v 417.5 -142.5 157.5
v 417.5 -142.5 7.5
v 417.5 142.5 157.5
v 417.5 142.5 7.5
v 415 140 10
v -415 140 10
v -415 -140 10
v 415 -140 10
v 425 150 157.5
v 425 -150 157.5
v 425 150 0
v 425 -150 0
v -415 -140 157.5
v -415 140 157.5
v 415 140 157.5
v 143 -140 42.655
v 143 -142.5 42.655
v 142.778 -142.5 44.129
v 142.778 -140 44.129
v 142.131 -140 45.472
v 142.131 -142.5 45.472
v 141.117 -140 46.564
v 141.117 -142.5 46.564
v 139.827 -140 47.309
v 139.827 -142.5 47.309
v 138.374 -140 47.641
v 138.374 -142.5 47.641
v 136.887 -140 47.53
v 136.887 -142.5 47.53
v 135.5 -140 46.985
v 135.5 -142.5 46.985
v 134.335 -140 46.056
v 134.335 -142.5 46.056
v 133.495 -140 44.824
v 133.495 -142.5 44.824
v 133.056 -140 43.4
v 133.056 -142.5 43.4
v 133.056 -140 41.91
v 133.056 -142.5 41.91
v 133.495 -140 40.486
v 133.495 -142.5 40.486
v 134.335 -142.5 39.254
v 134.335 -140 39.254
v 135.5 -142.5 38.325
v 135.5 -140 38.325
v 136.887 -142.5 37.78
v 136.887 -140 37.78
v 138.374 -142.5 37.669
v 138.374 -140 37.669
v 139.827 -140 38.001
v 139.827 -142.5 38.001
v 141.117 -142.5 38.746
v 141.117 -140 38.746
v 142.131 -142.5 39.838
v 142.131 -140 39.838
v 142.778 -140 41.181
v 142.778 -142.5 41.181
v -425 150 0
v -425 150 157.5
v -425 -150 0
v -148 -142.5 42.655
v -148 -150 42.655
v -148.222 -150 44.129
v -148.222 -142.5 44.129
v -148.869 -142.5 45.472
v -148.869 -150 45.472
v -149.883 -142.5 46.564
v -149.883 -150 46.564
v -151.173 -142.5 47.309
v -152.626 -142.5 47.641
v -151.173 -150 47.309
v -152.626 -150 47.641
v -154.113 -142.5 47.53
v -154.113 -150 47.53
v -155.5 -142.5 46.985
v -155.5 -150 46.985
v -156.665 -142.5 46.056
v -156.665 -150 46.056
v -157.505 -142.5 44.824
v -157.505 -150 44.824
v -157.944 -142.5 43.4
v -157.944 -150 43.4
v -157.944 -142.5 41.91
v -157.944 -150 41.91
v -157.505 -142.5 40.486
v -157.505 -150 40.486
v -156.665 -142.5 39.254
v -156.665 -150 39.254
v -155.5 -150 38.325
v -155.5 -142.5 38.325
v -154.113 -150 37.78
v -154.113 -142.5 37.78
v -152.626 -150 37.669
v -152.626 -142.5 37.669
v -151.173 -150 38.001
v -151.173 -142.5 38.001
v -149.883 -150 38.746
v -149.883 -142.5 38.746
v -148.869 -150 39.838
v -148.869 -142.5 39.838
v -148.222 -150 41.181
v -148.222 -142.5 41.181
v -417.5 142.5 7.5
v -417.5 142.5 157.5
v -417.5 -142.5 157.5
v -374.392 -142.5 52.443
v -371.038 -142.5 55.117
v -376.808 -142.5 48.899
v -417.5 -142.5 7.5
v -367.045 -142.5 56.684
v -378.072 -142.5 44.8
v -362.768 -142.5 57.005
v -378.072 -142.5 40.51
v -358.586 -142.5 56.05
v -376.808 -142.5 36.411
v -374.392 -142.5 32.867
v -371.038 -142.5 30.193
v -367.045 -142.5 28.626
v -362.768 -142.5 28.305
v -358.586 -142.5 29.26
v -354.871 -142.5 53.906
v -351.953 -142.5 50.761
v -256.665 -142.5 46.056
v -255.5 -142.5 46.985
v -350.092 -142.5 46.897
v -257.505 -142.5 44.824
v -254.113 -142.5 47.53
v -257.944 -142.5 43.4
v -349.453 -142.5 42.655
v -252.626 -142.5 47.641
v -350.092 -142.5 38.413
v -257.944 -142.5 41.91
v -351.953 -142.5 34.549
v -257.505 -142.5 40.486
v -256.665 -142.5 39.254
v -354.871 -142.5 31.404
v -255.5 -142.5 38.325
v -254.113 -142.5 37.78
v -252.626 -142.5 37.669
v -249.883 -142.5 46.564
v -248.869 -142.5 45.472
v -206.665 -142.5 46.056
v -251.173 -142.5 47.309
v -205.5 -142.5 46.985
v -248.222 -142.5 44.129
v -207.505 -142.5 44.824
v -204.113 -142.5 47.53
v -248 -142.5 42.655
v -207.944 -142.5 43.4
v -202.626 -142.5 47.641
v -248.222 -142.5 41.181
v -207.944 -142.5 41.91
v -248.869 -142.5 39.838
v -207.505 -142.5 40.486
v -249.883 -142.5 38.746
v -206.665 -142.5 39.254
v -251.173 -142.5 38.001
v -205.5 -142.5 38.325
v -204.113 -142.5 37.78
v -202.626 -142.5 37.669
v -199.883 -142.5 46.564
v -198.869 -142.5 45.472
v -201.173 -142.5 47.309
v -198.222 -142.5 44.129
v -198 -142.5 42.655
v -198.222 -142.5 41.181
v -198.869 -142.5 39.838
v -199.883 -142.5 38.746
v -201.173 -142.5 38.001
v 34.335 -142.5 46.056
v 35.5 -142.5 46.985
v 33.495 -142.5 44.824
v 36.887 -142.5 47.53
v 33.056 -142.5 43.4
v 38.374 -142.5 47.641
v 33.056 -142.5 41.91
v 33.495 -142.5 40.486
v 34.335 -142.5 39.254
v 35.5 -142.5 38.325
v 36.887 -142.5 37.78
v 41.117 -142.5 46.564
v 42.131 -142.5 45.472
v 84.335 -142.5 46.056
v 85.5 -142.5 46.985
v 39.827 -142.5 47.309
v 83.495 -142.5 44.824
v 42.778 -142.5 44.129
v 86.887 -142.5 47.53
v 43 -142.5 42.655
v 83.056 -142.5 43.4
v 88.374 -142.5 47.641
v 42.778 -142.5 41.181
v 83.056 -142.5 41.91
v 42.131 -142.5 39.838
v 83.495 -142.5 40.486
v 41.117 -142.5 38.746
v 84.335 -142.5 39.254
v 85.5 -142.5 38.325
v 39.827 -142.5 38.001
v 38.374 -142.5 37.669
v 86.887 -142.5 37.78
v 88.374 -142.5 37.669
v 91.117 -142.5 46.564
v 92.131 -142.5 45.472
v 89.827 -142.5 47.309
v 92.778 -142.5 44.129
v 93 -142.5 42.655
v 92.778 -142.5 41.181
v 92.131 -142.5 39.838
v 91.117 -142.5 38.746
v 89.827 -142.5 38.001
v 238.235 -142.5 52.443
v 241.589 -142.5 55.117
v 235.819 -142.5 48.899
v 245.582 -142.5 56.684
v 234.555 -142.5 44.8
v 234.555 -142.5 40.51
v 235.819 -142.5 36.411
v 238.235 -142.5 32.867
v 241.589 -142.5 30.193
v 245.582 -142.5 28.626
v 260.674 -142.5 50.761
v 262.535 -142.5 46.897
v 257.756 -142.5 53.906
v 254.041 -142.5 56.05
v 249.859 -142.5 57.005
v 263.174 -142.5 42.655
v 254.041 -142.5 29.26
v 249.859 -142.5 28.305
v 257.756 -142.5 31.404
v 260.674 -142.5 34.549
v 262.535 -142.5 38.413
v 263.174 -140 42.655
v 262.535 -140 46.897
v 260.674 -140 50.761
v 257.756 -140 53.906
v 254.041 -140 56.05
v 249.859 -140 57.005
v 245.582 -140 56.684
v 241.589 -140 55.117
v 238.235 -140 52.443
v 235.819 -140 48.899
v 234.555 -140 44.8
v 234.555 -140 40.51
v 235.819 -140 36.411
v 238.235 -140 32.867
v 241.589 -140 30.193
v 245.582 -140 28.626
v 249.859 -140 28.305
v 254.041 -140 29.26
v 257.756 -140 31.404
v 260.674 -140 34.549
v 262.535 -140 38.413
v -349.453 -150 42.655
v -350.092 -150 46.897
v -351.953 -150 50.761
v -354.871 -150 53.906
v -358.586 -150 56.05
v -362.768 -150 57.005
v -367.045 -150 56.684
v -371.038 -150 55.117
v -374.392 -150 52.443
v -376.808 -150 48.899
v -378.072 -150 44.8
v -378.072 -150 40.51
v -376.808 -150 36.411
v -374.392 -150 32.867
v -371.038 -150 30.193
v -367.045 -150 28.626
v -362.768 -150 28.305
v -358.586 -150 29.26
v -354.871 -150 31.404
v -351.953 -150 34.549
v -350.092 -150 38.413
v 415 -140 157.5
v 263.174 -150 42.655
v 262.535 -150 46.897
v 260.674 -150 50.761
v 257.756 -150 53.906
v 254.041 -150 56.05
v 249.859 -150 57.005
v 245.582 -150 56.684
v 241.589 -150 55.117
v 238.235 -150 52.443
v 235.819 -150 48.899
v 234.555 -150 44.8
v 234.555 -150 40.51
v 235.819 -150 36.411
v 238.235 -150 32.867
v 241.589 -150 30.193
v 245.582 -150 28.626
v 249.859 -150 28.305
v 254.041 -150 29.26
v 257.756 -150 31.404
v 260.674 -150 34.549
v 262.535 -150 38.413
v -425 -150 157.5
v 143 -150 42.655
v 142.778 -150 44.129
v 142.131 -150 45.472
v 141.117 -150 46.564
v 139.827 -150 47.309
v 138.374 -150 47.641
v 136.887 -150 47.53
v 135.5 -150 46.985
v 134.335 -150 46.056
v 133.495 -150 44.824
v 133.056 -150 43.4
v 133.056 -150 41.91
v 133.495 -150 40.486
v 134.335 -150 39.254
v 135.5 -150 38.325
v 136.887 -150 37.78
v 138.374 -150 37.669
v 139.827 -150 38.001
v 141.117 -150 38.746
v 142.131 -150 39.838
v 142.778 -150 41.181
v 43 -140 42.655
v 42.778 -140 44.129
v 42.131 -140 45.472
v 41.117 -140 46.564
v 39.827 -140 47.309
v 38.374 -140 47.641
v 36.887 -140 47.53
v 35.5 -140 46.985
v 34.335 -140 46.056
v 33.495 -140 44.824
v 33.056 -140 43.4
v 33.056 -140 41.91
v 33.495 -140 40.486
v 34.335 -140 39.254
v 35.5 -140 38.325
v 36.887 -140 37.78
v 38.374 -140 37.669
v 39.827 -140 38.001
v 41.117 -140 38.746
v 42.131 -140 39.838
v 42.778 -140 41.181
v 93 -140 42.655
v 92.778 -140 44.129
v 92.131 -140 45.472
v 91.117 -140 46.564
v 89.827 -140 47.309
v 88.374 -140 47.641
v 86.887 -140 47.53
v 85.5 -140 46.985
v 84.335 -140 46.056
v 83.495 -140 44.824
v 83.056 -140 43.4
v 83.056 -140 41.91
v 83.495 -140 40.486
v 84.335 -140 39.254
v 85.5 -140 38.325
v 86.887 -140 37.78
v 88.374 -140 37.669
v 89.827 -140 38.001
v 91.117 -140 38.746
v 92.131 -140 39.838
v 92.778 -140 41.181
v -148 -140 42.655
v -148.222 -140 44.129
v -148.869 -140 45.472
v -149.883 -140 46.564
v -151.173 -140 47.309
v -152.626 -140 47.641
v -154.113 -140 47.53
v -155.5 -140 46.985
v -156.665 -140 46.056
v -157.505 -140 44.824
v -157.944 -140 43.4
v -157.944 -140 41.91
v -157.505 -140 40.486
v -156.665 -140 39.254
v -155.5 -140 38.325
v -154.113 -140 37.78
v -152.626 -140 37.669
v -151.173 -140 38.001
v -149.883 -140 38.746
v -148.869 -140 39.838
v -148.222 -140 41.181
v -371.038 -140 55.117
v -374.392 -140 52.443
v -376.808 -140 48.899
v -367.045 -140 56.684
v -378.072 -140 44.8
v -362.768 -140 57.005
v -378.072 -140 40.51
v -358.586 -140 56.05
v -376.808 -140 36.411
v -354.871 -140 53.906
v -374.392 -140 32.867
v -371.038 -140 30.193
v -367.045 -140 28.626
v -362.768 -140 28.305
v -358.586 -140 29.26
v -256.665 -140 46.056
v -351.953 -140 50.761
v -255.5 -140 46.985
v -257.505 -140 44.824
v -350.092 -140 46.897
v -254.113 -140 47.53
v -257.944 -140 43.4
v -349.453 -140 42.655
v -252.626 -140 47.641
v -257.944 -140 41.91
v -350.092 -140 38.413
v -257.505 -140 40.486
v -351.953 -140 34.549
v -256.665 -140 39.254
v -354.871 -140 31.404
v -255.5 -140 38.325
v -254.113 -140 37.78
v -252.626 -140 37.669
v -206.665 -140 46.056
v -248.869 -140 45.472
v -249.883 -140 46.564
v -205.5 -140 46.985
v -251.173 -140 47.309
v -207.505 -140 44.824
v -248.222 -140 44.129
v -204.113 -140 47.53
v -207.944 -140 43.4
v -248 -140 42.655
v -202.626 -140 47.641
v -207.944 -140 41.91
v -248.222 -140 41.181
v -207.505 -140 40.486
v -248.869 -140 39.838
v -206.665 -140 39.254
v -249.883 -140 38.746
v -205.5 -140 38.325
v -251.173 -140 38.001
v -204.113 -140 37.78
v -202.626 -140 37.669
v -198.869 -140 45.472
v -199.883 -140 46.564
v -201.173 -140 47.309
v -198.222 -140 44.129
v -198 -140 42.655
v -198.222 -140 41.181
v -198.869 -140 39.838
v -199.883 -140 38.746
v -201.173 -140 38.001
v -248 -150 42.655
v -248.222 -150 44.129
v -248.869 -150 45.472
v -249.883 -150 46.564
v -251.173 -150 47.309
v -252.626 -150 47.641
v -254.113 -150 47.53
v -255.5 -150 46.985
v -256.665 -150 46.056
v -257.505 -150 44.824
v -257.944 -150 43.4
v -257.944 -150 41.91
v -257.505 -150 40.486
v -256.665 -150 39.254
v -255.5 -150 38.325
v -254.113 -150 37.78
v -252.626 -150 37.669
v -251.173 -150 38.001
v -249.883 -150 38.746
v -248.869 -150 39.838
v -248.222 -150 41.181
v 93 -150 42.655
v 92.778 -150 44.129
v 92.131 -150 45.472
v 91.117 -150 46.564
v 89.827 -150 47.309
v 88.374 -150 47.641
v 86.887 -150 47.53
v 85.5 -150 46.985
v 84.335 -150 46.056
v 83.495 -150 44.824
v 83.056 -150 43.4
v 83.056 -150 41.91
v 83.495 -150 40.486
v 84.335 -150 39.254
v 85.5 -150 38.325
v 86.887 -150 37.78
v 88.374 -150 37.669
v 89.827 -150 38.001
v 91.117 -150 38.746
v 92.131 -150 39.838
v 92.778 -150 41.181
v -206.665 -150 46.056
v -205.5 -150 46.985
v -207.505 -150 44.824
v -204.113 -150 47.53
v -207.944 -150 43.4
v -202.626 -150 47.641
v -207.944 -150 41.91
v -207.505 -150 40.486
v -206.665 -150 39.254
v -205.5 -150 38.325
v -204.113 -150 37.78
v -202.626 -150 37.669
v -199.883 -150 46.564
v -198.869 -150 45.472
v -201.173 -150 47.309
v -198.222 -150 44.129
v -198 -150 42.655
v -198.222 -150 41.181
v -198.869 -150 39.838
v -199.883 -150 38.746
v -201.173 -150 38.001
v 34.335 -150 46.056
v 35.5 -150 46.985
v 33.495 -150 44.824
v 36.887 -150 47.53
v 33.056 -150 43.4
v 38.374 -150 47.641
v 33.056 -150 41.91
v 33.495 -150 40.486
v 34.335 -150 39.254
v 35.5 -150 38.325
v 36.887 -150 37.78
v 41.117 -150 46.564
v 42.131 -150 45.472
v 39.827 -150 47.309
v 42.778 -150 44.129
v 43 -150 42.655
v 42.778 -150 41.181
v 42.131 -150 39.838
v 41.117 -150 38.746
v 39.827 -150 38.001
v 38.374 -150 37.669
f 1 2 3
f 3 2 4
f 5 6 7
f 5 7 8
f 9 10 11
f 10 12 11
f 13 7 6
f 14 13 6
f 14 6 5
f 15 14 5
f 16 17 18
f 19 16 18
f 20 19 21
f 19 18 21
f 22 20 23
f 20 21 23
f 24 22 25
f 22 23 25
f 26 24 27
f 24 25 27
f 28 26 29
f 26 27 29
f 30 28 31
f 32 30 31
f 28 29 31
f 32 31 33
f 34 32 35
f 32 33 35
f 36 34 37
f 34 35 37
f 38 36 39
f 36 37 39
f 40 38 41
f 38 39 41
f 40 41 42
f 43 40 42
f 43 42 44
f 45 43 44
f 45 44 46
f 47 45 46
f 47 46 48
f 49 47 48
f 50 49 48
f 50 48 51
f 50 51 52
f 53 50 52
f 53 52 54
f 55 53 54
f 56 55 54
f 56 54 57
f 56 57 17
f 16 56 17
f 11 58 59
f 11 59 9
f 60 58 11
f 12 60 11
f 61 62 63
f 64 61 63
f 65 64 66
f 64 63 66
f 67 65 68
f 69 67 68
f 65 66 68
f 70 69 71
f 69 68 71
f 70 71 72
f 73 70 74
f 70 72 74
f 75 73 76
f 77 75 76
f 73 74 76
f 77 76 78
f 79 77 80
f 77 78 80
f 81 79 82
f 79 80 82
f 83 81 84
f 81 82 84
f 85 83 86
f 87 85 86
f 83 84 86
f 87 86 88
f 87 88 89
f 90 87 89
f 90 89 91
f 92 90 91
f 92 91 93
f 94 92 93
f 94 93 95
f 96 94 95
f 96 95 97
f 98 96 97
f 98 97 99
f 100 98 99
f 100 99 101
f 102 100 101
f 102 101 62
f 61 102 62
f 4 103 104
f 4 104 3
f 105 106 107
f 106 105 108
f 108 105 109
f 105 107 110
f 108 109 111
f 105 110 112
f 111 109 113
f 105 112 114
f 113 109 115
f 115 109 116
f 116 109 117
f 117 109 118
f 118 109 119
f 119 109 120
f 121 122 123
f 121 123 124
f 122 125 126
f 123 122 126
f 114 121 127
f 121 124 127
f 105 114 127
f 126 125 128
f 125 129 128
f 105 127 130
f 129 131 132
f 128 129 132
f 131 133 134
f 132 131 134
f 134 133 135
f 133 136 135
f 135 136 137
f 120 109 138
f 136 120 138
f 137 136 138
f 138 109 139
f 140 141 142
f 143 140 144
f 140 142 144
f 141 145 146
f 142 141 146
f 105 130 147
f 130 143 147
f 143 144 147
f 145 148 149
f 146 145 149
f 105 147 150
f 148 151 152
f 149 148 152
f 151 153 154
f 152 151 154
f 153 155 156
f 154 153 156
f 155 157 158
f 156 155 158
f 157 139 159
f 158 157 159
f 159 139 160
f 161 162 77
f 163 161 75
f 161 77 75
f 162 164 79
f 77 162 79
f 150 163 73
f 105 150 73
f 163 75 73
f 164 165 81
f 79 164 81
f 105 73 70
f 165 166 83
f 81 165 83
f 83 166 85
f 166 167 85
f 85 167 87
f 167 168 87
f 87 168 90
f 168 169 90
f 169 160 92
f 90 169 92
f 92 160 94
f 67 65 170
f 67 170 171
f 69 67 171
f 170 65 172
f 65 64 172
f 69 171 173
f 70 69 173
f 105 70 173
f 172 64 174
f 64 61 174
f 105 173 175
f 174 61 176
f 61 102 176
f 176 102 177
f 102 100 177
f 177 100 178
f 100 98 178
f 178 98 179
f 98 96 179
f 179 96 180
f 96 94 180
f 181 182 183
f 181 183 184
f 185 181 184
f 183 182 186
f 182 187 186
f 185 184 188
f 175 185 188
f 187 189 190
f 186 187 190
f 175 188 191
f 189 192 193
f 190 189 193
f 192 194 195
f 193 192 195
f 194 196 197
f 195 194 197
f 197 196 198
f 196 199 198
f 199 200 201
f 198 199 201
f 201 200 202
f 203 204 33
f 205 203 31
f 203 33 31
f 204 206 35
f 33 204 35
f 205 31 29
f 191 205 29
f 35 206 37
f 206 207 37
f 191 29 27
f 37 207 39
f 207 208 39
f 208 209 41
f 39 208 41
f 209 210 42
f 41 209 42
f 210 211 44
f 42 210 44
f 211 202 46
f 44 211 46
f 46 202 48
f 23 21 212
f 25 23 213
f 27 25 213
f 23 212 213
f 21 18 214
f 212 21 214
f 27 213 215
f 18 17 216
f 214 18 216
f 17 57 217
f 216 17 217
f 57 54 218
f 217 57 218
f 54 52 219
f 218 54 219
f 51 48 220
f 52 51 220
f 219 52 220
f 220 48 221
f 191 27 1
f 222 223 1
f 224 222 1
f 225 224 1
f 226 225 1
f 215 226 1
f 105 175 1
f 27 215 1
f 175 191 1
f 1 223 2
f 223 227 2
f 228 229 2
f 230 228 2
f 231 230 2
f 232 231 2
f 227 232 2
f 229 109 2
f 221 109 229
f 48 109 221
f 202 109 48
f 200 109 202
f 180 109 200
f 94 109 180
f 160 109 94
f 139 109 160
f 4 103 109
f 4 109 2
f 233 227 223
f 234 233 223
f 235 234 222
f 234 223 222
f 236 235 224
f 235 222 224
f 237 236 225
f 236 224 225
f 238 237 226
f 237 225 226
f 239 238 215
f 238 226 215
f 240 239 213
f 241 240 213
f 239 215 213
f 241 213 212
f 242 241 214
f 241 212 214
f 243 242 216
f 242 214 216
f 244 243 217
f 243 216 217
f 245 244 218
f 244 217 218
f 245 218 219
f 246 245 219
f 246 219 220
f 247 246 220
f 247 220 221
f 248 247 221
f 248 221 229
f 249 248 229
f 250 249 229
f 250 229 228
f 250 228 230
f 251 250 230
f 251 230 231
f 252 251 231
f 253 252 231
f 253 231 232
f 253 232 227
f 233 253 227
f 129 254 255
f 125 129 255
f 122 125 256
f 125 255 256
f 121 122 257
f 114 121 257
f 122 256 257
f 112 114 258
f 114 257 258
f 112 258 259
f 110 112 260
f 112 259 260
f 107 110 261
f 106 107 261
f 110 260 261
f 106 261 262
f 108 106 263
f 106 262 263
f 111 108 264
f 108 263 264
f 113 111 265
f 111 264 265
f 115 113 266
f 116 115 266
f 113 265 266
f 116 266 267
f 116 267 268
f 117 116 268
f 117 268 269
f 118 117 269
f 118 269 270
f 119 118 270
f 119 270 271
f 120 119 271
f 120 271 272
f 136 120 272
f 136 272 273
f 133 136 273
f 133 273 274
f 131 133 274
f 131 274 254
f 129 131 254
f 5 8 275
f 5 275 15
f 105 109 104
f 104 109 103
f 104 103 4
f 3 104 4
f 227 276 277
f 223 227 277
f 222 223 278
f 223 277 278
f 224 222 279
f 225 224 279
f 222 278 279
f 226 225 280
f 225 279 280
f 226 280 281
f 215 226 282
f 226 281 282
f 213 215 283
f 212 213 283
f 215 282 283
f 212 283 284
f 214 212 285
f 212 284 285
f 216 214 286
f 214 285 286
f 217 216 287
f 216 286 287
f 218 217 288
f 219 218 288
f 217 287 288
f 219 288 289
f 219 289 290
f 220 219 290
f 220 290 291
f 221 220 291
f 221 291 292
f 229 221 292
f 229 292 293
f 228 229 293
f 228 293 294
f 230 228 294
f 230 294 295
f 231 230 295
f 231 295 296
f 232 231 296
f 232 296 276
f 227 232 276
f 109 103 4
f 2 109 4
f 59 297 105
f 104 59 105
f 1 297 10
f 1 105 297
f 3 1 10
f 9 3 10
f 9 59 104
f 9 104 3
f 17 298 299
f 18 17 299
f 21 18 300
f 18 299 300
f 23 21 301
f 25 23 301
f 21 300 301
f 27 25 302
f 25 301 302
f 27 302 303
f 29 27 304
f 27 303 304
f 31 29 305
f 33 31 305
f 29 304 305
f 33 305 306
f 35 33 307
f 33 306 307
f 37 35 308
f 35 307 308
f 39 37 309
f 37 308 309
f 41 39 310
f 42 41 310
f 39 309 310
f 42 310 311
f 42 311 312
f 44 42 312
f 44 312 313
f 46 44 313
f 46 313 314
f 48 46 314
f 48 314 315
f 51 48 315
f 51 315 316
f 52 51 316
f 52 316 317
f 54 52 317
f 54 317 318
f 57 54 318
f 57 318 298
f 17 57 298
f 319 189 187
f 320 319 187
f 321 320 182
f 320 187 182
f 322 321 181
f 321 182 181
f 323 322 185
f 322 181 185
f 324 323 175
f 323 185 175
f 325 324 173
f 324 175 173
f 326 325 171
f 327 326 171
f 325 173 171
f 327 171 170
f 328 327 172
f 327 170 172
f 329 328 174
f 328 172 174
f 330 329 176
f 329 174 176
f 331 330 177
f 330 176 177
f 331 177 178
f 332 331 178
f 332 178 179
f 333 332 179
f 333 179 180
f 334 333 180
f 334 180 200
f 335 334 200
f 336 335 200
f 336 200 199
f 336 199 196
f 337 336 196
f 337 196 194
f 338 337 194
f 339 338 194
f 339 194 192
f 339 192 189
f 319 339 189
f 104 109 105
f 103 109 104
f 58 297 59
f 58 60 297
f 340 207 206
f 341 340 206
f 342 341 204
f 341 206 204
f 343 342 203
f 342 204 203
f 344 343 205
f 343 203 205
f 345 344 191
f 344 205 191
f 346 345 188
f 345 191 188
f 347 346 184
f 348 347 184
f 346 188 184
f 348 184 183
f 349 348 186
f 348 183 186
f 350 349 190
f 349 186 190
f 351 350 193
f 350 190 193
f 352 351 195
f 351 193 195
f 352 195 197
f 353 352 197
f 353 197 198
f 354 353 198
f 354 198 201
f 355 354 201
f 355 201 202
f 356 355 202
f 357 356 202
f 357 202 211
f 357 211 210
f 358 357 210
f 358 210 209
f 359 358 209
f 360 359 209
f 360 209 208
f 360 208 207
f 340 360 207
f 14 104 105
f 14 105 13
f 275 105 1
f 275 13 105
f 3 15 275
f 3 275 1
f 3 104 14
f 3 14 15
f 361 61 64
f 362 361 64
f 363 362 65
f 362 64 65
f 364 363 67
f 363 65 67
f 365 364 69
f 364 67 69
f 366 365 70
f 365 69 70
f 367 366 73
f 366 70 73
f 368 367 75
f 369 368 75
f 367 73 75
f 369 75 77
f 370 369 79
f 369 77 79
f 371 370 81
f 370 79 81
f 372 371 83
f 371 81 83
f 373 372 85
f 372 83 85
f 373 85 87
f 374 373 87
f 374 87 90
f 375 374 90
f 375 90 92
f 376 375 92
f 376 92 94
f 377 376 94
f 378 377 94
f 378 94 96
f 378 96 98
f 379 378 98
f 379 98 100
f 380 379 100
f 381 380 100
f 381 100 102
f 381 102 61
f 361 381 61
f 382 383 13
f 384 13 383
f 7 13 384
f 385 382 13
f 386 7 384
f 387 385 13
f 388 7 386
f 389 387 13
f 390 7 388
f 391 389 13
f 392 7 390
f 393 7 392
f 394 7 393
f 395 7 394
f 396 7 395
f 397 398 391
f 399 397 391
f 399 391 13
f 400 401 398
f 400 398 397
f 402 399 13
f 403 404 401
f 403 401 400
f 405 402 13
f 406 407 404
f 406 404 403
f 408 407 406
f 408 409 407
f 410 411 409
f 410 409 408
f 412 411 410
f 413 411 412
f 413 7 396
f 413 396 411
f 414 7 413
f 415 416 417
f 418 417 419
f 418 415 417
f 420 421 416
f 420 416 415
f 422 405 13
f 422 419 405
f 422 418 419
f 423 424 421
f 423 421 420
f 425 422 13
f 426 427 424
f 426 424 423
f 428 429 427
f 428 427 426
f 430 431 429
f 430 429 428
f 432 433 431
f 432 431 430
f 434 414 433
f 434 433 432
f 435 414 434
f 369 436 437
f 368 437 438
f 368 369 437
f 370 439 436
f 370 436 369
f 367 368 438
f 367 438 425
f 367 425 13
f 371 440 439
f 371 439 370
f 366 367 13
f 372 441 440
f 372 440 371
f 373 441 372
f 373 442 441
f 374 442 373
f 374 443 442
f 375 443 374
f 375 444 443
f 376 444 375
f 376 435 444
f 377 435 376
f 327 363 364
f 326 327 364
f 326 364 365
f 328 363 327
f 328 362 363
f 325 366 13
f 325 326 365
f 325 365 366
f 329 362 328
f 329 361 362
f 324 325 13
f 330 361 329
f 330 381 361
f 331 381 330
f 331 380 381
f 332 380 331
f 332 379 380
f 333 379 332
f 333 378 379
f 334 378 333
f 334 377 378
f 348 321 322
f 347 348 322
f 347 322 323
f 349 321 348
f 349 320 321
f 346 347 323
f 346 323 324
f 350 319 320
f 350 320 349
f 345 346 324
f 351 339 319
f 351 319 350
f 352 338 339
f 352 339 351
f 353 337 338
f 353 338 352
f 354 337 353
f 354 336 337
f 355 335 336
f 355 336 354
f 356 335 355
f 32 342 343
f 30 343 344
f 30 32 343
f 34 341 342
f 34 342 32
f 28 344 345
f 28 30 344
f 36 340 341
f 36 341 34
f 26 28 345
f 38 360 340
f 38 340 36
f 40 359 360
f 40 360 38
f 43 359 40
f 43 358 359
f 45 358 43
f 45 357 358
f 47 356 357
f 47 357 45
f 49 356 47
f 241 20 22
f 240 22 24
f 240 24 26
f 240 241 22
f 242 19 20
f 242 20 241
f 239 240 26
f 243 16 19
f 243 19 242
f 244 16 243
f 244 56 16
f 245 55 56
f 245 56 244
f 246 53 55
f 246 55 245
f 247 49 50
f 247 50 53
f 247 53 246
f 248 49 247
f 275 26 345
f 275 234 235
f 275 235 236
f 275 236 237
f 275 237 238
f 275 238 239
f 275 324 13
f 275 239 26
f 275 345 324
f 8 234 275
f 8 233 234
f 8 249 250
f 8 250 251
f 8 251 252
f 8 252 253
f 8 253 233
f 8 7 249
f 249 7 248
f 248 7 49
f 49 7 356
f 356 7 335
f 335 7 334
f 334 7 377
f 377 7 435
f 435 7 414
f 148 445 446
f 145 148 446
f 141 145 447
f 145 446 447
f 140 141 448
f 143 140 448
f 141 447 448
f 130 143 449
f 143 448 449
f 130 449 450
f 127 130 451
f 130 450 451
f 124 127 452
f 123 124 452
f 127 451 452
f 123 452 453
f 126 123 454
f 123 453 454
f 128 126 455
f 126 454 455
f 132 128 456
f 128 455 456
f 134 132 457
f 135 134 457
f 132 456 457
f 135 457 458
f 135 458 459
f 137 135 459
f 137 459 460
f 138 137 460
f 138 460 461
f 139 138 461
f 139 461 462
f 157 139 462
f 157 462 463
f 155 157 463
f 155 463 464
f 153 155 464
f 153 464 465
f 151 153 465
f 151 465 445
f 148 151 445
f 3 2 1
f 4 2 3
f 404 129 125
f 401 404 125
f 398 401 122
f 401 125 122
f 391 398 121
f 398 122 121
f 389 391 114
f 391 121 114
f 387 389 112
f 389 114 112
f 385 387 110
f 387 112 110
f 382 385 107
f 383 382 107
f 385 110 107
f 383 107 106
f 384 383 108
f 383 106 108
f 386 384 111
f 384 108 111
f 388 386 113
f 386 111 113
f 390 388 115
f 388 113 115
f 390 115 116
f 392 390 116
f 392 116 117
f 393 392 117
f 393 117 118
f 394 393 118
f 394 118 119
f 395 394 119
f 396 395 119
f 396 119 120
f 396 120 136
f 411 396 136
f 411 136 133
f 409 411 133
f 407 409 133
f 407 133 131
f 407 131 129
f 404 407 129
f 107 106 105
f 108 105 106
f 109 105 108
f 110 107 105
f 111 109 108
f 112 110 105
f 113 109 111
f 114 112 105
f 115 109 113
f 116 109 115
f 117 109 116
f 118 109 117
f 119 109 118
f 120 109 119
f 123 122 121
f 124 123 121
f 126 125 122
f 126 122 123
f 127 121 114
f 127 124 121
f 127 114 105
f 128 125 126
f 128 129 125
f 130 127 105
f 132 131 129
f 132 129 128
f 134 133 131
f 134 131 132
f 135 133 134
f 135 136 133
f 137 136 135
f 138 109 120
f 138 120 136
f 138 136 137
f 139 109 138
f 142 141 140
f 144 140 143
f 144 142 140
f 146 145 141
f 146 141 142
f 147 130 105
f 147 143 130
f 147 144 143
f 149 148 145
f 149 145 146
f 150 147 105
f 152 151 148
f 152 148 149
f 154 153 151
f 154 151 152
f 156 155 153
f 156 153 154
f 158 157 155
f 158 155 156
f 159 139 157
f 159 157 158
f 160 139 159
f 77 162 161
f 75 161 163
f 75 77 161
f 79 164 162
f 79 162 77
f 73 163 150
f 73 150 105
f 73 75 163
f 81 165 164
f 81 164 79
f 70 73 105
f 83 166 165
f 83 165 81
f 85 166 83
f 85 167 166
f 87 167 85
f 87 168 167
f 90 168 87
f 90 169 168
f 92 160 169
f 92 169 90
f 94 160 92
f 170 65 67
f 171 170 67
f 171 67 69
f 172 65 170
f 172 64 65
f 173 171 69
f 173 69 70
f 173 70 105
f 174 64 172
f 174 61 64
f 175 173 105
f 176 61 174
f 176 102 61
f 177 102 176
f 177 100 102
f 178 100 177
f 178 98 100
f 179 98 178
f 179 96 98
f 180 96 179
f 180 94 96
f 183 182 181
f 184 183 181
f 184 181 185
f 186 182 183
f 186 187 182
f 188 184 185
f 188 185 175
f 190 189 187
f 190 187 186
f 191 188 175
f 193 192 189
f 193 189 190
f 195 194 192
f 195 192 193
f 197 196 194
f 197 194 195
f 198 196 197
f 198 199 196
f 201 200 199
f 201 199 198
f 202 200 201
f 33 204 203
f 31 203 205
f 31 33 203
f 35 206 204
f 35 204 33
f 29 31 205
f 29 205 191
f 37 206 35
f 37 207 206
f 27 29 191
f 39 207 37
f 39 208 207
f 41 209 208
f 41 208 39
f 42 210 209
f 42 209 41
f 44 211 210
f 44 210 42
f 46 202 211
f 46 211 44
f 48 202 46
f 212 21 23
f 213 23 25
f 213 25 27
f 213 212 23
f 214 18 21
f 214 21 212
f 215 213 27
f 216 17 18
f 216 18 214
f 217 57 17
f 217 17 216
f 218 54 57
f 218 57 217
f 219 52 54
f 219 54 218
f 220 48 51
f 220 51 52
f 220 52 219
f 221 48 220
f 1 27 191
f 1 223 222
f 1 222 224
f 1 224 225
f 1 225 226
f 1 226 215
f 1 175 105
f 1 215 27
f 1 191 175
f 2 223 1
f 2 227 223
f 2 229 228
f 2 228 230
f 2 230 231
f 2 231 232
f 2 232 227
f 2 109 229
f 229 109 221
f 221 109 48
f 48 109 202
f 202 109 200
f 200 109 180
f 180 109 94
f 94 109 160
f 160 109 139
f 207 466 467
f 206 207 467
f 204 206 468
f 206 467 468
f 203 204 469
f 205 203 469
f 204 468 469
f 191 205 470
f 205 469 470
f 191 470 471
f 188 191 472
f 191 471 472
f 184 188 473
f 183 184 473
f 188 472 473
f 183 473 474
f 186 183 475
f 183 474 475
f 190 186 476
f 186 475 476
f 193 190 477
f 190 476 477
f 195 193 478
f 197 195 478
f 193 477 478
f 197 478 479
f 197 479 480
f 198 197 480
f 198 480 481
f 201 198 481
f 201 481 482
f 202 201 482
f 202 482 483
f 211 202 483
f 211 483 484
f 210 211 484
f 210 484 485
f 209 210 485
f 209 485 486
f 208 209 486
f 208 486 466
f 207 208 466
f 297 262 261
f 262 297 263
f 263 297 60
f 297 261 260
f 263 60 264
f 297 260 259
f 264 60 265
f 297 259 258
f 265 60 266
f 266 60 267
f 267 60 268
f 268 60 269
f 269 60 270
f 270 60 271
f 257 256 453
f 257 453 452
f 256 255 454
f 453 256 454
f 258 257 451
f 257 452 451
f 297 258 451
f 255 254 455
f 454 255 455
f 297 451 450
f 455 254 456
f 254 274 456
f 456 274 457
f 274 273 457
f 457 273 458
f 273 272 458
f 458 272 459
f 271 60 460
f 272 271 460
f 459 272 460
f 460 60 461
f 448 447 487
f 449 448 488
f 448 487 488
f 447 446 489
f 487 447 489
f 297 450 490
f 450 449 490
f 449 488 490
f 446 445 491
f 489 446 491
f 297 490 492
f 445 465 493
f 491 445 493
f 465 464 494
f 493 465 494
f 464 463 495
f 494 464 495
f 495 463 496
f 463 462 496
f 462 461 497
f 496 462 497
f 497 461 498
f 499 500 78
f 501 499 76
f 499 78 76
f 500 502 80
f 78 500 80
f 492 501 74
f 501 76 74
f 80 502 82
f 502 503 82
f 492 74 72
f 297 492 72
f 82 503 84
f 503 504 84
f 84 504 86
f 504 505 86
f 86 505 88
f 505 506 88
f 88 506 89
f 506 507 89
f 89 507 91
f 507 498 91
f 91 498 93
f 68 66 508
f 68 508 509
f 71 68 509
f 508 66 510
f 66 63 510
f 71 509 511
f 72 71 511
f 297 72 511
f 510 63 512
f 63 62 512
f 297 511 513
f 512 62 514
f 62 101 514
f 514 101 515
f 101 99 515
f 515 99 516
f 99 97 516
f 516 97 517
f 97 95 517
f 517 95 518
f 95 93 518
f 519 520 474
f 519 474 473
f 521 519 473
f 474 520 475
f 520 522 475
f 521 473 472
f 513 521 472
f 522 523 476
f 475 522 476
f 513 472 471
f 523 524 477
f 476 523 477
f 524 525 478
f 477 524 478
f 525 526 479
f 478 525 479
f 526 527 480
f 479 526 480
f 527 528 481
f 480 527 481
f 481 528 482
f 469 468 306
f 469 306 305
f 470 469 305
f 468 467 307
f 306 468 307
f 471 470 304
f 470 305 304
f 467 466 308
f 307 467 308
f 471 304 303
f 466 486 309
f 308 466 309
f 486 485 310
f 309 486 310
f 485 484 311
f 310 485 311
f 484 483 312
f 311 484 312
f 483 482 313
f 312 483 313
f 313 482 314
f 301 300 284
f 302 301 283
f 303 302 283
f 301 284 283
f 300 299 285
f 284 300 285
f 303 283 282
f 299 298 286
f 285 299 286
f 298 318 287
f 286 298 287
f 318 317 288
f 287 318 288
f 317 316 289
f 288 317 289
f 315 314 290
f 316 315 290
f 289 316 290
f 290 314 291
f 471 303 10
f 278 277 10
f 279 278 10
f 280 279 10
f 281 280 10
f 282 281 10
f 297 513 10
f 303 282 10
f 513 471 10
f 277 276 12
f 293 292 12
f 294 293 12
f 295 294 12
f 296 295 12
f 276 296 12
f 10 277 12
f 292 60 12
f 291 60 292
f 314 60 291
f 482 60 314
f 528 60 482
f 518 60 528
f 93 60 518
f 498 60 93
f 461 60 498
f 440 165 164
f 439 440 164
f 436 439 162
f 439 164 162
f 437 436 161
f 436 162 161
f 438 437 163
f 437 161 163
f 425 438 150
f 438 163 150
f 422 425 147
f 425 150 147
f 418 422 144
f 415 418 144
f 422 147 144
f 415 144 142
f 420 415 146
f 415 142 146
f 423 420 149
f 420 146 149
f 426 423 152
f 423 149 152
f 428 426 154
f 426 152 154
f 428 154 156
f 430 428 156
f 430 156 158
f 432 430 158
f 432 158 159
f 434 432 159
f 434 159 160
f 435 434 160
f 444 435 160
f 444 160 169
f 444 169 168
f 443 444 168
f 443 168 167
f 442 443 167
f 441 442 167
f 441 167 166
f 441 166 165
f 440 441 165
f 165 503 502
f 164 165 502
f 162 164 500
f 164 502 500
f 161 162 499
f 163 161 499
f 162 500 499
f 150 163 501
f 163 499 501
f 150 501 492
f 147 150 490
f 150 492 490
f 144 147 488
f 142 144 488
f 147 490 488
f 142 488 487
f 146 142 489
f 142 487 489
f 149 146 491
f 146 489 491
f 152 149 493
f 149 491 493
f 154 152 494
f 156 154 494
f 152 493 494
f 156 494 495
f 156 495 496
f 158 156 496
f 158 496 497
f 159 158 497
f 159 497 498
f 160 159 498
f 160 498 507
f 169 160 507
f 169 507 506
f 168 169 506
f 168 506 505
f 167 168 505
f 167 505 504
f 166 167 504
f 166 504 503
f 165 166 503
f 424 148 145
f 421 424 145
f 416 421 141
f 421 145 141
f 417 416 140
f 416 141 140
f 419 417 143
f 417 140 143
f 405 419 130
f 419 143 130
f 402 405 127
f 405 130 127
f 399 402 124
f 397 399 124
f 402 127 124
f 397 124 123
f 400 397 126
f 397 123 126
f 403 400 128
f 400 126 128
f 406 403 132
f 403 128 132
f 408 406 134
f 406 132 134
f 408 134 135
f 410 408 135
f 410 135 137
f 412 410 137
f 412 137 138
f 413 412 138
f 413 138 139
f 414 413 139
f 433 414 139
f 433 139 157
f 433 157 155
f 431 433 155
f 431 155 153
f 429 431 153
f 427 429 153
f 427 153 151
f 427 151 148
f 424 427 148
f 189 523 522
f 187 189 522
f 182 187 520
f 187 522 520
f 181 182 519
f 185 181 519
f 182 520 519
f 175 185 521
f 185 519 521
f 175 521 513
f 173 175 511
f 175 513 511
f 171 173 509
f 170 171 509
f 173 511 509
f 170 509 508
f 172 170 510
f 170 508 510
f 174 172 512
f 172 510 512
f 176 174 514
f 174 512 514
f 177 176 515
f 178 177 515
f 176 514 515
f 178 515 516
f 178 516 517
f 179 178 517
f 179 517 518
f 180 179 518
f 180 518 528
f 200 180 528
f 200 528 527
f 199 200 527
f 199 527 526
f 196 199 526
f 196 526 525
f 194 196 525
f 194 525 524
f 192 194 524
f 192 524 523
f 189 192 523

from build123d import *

# Parameters (mm, degrees)
F0_W     = 850
F0_H     = 300
F1_DEPTH = 7.5
F2_W     = 850
F2_H     = 300
F2_W_2   = 835
F2_H_2   = 285
F3_DEPTH = 150
F4_DEPTH = 2.5
F5_W     = 835
F5_H     = 285
F5_W_2   = 830
F5_H_2   = 280
F6_DEPTH = 147.5
F7_R     = 5
F7_R_2   = 14.39
F8_DEPTH = 25


with BuildPart() as f1:
    # F0 (on Top) → F1 (new body)
    with BuildSketch(Plane.XY):
        Rectangle(F0_W, F0_H)
    extrude(amount=F1_DEPTH)

    # F2 (on face) → F3 (join)
    with BuildSketch(Plane.XY.offset(7.5)):
        Rectangle(F2_W, F2_H)
        Rectangle(F2_W_2, F2_H_2, mode=Mode.SUBTRACT)
    extrude(amount=F3_DEPTH)


with BuildPart() as f4:
    # F4 (new): a face of the model
    f4_faces = [f1.part.faces().sort_by_distance(p)[0] for p in [
        (0, 0, 7.5),
    ]]
    extrude(f4_faces, amount=F4_DEPTH)

    # F5 (on face) → F6 (join)
    with BuildSketch(Plane.XY.offset(10)):
        Rectangle(F5_W, F5_H)
        Rectangle(F5_W_2, F5_H_2, mode=Mode.SUBTRACT)
    extrude(amount=F6_DEPTH)


with BuildPart() as f8_tool:
    # F7 (on face) → F8 (new body)
    with BuildSketch(Plane.XZ.offset(150)):
        with Locations((-153, 42.655)):
            Circle(F7_R)
        with Locations((38, 42.655)):
            Circle(F7_R)
        with Locations((88, 42.655)):
            Circle(F7_R)
        with Locations((138, 42.655)):
            Circle(F7_R)
        with Locations((-203, 42.655)):
            Circle(F7_R)
        with Locations((-253, 42.655)):
            Circle(F7_R)
        with Locations((248.784, 42.655)):
            Circle(F7_R_2)
        with Locations((-363.843, 42.655)):
            Circle(F7_R_2)
    extrude(amount=-F8_DEPTH)


with BuildPart() as f1_1:
    add(f1.part)

    # F8: cut by f8_tool
    add(f8_tool.part, mode=Mode.SUBTRACT)


with BuildPart() as f4_1:
    add(f4.part)

    # F8: cut by f8_tool
    add(f8_tool.part, mode=Mode.SUBTRACT)


solid = Compound([f1_1.part, f4_1.part])
